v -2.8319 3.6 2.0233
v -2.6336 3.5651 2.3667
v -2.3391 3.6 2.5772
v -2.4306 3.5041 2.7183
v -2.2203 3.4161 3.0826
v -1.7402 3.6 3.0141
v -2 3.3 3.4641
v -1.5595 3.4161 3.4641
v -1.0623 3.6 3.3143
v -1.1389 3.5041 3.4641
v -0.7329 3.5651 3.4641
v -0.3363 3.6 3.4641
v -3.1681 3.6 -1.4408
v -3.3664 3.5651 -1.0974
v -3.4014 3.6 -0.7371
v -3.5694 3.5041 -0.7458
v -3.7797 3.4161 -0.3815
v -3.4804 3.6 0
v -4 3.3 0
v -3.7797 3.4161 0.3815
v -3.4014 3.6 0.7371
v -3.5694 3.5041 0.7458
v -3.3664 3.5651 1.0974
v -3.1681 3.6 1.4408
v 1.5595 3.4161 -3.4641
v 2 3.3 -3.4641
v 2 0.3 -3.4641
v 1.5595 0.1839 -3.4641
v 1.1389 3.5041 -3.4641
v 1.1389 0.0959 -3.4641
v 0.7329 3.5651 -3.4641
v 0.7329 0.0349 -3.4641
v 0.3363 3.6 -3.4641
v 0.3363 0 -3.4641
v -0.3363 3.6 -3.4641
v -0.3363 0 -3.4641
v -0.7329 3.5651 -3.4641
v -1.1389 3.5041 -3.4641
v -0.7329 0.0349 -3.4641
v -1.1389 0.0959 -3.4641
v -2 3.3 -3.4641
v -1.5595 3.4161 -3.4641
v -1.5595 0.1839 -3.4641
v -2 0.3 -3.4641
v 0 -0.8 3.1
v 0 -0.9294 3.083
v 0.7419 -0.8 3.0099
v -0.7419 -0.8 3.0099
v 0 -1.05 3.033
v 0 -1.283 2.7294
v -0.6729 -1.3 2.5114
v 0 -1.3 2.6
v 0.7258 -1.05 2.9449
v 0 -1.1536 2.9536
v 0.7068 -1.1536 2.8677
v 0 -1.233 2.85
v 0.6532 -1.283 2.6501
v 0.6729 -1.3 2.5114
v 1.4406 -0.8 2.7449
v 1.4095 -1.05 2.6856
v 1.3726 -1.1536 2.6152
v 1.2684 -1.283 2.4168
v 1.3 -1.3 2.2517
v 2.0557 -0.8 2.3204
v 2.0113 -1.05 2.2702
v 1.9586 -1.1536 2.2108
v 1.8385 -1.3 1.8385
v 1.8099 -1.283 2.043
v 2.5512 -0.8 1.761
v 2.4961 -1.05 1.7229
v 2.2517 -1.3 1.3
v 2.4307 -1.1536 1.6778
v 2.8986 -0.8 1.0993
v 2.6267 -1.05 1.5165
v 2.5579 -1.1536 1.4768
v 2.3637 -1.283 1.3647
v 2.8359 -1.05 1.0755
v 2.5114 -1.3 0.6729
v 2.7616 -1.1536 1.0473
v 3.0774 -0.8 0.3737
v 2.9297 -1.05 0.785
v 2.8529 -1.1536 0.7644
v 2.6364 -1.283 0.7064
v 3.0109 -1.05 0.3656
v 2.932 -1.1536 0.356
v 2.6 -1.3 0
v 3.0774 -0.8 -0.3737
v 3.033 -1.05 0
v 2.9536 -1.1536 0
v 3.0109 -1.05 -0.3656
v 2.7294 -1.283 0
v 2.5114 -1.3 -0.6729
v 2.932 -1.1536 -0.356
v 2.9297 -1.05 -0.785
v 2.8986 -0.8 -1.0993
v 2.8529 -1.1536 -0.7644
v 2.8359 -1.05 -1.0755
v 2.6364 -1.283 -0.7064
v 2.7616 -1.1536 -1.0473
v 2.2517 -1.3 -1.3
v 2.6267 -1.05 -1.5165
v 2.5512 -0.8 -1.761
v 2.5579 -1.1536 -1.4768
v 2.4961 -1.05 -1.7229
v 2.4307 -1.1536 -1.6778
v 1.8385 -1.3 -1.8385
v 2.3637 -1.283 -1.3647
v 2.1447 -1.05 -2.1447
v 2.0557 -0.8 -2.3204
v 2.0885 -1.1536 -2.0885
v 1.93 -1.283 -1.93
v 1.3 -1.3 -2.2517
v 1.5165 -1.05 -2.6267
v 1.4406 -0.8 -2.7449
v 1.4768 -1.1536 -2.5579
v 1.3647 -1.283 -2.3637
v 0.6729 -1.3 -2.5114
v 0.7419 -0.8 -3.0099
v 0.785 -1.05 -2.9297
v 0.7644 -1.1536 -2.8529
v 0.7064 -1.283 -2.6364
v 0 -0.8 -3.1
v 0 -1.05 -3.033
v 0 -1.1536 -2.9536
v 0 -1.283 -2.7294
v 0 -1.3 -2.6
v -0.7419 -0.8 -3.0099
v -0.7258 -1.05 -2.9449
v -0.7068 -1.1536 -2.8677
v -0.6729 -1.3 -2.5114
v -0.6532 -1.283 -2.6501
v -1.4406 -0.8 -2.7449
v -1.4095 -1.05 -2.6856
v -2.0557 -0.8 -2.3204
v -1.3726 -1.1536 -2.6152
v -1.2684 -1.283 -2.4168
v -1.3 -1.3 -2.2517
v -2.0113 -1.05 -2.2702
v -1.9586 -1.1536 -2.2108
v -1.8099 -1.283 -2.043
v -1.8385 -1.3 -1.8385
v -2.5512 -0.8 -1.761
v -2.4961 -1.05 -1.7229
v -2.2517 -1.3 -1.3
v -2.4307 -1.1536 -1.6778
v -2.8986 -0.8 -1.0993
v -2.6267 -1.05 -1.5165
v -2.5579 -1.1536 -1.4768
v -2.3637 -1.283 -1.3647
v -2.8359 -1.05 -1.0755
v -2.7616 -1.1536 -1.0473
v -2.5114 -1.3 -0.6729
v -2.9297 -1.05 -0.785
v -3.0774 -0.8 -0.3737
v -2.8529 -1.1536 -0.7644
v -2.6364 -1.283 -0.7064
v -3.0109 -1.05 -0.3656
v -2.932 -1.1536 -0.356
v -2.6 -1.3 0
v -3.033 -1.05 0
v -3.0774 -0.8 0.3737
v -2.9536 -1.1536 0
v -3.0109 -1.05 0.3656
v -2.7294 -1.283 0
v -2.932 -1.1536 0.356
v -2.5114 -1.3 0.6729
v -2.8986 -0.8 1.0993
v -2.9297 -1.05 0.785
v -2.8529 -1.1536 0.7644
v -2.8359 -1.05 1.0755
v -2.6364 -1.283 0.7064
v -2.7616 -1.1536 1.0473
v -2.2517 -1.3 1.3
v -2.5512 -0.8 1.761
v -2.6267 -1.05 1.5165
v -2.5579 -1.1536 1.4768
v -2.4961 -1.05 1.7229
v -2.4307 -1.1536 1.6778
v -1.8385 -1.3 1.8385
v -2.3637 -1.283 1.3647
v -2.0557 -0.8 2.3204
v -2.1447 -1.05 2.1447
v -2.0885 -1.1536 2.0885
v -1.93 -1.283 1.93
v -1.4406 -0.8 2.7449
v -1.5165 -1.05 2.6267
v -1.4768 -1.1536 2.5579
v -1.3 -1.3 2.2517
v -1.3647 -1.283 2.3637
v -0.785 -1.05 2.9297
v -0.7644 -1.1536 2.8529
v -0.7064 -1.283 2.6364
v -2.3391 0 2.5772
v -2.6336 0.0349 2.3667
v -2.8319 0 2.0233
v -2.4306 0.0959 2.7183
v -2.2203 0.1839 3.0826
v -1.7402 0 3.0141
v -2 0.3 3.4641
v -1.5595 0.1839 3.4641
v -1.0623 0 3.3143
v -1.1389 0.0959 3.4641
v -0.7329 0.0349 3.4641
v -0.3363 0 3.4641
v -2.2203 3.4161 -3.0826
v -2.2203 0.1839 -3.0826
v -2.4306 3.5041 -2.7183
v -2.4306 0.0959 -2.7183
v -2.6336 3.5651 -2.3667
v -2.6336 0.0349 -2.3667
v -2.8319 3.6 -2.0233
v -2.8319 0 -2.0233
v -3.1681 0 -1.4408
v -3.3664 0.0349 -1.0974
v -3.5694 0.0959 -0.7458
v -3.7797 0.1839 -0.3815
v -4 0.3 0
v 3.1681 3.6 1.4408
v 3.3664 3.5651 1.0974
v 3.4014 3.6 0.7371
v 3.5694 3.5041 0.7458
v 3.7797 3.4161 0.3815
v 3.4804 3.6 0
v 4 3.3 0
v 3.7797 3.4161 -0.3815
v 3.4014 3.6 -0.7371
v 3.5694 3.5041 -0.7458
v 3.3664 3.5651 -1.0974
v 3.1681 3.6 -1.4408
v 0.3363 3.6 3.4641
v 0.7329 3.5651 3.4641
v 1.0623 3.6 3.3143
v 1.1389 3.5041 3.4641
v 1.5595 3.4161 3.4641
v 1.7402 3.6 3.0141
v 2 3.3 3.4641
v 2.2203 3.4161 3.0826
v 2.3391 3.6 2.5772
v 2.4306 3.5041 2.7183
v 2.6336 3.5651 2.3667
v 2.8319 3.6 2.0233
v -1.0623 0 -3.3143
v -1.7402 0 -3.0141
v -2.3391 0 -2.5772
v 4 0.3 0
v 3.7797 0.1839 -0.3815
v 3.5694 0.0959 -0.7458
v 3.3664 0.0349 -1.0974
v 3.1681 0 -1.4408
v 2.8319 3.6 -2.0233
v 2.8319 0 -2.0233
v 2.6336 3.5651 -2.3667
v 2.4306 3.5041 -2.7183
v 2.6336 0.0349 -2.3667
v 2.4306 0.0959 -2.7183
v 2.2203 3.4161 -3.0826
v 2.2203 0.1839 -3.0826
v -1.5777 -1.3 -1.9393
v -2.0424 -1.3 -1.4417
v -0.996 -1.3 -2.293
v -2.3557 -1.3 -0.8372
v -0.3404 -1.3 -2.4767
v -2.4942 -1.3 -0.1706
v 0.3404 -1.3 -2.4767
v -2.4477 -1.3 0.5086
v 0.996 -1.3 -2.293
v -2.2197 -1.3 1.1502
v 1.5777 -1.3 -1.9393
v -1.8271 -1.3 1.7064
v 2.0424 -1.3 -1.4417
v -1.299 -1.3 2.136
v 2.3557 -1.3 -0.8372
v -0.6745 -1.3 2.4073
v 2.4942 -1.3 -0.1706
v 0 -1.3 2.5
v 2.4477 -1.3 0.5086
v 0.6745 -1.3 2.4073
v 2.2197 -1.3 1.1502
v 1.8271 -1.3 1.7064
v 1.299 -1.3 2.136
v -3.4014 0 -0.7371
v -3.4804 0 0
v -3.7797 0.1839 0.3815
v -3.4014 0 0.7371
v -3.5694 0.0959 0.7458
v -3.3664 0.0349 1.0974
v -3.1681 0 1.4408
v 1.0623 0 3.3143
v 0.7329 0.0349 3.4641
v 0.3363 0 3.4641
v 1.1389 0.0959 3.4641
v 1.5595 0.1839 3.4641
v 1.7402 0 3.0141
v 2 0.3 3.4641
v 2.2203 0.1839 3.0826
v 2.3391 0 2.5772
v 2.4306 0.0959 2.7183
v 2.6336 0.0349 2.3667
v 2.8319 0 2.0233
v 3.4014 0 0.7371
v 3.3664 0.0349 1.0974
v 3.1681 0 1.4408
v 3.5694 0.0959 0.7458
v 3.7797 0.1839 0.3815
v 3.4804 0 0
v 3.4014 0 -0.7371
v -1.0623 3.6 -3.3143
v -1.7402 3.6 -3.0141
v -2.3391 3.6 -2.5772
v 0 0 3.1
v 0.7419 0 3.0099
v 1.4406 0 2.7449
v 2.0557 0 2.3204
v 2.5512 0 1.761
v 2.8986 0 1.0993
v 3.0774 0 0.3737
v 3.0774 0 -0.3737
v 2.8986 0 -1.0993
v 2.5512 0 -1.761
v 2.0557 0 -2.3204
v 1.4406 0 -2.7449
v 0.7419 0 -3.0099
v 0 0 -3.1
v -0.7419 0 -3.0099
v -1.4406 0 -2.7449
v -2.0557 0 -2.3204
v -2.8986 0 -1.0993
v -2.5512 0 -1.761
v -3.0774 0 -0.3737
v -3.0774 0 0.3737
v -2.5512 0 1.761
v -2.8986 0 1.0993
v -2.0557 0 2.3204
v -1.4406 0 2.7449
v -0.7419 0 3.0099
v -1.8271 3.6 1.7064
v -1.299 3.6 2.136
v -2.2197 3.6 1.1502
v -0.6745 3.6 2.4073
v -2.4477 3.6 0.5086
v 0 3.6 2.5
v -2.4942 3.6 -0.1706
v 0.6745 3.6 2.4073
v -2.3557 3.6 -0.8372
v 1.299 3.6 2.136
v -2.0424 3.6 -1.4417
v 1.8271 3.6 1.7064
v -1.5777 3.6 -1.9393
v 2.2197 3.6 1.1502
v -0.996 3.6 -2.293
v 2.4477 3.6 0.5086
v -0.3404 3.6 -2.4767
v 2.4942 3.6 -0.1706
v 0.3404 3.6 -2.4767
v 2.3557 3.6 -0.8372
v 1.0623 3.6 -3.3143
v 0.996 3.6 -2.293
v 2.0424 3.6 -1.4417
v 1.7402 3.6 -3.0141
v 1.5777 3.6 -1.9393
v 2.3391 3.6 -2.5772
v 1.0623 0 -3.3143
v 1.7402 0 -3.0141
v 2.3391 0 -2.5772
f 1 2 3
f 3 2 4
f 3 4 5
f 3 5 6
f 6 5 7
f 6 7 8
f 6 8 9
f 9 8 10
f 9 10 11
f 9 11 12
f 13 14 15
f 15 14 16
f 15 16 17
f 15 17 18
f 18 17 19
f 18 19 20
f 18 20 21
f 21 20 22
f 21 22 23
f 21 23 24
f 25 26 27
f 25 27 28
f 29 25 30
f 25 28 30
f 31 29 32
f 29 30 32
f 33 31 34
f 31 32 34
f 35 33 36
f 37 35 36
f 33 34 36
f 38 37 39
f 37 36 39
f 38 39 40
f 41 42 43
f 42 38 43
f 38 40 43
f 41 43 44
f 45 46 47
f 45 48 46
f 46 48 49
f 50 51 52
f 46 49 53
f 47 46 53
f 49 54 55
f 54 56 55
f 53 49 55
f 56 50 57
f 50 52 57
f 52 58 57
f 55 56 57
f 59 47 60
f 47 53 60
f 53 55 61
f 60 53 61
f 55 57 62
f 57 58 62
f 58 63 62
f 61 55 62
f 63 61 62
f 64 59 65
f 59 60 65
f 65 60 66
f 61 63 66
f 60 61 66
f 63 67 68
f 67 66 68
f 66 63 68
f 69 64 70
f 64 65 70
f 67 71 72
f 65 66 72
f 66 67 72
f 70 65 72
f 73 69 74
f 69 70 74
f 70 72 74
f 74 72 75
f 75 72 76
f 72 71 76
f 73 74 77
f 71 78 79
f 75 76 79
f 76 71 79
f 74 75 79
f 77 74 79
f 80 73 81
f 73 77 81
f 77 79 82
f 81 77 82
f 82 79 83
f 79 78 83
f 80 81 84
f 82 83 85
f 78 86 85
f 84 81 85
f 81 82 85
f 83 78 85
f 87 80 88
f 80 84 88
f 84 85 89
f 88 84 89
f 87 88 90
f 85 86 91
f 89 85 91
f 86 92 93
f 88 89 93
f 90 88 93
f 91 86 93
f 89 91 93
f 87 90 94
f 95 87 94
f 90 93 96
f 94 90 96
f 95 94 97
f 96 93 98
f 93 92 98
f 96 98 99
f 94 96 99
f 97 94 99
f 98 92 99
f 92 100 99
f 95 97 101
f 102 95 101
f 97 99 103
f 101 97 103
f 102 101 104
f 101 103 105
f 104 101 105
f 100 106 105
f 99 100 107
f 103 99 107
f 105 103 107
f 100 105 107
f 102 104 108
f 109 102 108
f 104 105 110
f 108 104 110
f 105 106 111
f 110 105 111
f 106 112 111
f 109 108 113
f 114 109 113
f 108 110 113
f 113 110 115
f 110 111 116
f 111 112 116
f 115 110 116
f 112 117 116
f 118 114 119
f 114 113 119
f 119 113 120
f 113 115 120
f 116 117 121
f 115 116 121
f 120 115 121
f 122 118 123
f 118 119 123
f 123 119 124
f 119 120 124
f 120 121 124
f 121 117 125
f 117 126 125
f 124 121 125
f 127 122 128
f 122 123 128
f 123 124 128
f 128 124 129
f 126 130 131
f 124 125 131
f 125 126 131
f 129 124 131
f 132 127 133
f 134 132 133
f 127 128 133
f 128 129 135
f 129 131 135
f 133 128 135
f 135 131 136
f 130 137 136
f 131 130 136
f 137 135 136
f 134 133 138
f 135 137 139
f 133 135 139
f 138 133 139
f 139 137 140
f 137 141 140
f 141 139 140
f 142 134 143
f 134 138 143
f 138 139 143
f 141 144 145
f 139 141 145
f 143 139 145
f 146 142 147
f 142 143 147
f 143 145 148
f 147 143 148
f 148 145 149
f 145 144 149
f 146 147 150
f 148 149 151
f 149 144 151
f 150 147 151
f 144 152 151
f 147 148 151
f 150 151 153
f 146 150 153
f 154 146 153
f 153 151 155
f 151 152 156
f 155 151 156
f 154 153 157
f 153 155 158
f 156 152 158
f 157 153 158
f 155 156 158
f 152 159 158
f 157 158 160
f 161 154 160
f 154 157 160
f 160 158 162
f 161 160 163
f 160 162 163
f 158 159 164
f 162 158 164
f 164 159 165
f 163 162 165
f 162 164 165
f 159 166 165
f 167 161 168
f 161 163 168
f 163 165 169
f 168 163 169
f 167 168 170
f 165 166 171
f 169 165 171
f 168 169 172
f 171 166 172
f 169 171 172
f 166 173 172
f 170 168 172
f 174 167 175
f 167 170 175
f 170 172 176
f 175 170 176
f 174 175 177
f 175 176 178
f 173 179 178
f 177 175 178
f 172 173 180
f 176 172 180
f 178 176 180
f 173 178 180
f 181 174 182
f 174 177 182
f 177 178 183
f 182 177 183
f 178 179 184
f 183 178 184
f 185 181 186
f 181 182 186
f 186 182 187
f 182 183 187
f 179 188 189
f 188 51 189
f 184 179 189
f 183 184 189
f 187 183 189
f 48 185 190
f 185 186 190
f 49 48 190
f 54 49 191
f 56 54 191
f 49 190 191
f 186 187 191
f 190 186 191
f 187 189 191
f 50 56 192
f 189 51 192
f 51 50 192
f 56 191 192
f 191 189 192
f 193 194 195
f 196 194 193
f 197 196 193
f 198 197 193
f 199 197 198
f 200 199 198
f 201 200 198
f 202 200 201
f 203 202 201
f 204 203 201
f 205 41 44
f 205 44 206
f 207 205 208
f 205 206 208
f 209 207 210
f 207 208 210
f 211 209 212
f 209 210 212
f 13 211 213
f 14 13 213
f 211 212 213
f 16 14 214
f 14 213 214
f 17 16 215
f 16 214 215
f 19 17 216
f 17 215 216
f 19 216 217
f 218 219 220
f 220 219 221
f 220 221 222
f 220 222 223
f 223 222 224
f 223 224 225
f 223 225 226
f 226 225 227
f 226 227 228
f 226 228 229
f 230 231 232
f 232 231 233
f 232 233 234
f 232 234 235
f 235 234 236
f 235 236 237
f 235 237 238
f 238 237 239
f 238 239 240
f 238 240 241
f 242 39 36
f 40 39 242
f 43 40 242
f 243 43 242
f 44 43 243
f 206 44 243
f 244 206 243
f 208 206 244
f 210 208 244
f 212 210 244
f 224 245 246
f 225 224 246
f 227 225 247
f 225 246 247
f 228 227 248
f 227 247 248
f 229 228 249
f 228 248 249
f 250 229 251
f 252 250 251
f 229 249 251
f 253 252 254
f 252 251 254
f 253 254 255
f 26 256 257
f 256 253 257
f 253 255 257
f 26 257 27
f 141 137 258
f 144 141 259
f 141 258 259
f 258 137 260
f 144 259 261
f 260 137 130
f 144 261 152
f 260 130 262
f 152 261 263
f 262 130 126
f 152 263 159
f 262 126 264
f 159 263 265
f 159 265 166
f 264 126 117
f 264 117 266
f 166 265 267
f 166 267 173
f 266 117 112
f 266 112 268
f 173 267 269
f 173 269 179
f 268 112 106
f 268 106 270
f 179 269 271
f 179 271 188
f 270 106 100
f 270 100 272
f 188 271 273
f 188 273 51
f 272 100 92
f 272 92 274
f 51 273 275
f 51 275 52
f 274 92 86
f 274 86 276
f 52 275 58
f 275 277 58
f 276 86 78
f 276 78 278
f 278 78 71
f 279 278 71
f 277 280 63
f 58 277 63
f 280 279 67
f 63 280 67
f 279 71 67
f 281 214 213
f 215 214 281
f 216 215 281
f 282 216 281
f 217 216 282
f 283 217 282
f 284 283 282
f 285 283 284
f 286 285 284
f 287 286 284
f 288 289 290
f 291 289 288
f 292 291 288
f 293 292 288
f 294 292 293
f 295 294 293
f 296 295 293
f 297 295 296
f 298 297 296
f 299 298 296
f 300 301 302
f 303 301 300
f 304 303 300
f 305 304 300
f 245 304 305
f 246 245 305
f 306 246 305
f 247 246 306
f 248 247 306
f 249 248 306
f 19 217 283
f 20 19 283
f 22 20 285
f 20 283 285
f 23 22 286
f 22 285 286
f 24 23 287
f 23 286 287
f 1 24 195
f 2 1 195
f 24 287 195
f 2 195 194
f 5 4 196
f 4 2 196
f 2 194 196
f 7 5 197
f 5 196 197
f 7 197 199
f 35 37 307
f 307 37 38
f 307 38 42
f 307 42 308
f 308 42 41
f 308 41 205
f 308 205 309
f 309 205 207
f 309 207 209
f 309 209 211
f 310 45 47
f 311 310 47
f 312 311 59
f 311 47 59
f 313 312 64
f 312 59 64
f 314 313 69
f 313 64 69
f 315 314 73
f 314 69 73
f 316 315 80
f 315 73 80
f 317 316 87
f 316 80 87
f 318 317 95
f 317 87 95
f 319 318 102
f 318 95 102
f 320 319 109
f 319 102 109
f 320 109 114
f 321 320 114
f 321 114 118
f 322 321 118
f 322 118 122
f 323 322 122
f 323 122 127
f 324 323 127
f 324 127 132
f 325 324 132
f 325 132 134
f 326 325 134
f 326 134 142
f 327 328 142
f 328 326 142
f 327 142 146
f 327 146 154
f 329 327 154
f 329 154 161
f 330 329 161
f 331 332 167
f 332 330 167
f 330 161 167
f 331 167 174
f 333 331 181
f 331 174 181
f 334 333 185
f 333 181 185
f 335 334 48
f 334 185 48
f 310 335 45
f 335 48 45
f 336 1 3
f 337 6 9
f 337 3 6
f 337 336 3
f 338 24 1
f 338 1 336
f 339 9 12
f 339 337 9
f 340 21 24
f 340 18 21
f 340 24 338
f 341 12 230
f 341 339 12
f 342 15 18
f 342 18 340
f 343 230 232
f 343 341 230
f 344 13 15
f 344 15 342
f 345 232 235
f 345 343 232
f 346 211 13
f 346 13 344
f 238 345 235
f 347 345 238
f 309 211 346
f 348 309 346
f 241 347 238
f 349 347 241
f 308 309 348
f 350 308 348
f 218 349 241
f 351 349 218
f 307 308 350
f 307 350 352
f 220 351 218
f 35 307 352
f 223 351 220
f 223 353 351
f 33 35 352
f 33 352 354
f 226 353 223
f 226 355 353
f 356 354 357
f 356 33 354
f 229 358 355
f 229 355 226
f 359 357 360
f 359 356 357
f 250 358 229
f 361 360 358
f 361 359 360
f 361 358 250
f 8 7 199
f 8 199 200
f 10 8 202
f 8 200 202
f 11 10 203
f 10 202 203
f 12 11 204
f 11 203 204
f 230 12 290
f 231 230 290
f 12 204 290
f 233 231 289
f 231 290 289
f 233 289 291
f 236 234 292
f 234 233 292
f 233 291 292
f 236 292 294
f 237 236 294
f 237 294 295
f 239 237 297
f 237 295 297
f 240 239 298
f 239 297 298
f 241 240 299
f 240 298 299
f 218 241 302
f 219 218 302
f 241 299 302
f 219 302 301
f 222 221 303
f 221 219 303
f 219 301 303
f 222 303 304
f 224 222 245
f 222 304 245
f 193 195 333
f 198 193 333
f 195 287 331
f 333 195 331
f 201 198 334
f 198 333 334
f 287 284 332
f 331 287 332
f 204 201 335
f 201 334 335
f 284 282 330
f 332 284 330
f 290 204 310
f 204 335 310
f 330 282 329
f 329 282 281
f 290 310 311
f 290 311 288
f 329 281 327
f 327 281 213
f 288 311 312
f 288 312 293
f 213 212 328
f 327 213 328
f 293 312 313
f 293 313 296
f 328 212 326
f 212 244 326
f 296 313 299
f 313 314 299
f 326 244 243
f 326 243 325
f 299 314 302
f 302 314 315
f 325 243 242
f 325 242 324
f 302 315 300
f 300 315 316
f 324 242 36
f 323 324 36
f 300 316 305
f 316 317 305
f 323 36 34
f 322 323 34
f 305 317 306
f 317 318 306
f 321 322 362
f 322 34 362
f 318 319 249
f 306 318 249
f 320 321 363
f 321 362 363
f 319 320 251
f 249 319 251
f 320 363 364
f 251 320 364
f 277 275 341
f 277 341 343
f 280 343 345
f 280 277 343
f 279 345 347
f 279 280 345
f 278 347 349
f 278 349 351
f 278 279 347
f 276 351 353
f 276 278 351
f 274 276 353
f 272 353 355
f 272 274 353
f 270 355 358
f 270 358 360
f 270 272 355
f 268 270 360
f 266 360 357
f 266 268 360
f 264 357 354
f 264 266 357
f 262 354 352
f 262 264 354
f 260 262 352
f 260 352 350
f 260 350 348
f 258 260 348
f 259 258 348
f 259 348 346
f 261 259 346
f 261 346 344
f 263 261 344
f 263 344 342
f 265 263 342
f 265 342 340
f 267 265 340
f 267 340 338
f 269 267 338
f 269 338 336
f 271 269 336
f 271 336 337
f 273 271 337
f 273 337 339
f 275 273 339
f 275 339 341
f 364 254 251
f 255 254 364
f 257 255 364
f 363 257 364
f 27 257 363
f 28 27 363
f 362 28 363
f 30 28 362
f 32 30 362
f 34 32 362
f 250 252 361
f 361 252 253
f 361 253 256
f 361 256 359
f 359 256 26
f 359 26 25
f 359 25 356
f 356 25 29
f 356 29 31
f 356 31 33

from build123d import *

# Parameters (mm, degrees)
SKETCH_1_R      = 2.5
EXTRUDE_1_DEPTH = 3.6
EXTRUDE_START   = -4.9
SKETCH_2_R      = 3.1
SKETCH_2_R_2    = 2.5
EXTRUDE_2_DEPTH = 4.9
FILLET_1_R      = 0.5


with BuildPart() as part:
    # 草图1 → 凸台-拉伸1 (new body)
    with BuildSketch(Plane(origin=(0, 0, 0), x_dir=(1, 0, 0), z_dir=(0, 1, 0))):
        Polygon((4, 0), (2, 3.464101615), (-2, 3.464101615), (-4, 0), (-2, -3.464101615), (2, -3.464101615), align=None)
        with Locations(Location((0, 0, 0), (0, 0, 270))):
            Circle(SKETCH_1_R, mode=Mode.SUBTRACT)
    extrude(amount=EXTRUDE_1_DEPTH)

    # 草图4 → 切除-旋转1 (revolve, cut)
    with BuildSketch(Plane(origin=(0, 0, 0), x_dir=(-0.49999999999999806, 0, 0.8660254037844398), z_dir=(-0.8660254037844397, 0, -0.499999999999998))):
        Polygon((0, 5.609401077), (-4, 3.3), (-4, 5.663718026), (-4, 6.109401077), (0, 6.109401077), align=None)
        Polygon((0, -2.509401077), (0, -2.009401077), (-4, 0.3), (-4, -2.063718026), (-4, -2.509401077), align=None)
    revolve(axis=Axis((0, 6.109401077, 0), (0, 1, 0)), mode=Mode.SUBTRACT)

    # 草图2 → 凸台-拉伸2 (add)
    with BuildSketch(Plane(origin=(0, 3.6, 0), x_dir=(1, 0, 0), z_dir=(0, 1, 0)).offset(EXTRUDE_START)):
        with Locations(Location((0, 0, 0), (0, 0, 270))):
            Circle(SKETCH_2_R)
        with Locations(Location((0, 0, 0), (0, 0, 270))):
            Circle(SKETCH_2_R_2, mode=Mode.SUBTRACT)
    extrude(amount=EXTRUDE_2_DEPTH)

    # 圆角1
    fillet_1_edges = [part.edges().sort_by_distance(p)[0] for p in [
        (0, -1.3, -3.1),
    ]]
    fillet(fillet_1_edges, radius=FILLET_1_R)


solid = part.part
